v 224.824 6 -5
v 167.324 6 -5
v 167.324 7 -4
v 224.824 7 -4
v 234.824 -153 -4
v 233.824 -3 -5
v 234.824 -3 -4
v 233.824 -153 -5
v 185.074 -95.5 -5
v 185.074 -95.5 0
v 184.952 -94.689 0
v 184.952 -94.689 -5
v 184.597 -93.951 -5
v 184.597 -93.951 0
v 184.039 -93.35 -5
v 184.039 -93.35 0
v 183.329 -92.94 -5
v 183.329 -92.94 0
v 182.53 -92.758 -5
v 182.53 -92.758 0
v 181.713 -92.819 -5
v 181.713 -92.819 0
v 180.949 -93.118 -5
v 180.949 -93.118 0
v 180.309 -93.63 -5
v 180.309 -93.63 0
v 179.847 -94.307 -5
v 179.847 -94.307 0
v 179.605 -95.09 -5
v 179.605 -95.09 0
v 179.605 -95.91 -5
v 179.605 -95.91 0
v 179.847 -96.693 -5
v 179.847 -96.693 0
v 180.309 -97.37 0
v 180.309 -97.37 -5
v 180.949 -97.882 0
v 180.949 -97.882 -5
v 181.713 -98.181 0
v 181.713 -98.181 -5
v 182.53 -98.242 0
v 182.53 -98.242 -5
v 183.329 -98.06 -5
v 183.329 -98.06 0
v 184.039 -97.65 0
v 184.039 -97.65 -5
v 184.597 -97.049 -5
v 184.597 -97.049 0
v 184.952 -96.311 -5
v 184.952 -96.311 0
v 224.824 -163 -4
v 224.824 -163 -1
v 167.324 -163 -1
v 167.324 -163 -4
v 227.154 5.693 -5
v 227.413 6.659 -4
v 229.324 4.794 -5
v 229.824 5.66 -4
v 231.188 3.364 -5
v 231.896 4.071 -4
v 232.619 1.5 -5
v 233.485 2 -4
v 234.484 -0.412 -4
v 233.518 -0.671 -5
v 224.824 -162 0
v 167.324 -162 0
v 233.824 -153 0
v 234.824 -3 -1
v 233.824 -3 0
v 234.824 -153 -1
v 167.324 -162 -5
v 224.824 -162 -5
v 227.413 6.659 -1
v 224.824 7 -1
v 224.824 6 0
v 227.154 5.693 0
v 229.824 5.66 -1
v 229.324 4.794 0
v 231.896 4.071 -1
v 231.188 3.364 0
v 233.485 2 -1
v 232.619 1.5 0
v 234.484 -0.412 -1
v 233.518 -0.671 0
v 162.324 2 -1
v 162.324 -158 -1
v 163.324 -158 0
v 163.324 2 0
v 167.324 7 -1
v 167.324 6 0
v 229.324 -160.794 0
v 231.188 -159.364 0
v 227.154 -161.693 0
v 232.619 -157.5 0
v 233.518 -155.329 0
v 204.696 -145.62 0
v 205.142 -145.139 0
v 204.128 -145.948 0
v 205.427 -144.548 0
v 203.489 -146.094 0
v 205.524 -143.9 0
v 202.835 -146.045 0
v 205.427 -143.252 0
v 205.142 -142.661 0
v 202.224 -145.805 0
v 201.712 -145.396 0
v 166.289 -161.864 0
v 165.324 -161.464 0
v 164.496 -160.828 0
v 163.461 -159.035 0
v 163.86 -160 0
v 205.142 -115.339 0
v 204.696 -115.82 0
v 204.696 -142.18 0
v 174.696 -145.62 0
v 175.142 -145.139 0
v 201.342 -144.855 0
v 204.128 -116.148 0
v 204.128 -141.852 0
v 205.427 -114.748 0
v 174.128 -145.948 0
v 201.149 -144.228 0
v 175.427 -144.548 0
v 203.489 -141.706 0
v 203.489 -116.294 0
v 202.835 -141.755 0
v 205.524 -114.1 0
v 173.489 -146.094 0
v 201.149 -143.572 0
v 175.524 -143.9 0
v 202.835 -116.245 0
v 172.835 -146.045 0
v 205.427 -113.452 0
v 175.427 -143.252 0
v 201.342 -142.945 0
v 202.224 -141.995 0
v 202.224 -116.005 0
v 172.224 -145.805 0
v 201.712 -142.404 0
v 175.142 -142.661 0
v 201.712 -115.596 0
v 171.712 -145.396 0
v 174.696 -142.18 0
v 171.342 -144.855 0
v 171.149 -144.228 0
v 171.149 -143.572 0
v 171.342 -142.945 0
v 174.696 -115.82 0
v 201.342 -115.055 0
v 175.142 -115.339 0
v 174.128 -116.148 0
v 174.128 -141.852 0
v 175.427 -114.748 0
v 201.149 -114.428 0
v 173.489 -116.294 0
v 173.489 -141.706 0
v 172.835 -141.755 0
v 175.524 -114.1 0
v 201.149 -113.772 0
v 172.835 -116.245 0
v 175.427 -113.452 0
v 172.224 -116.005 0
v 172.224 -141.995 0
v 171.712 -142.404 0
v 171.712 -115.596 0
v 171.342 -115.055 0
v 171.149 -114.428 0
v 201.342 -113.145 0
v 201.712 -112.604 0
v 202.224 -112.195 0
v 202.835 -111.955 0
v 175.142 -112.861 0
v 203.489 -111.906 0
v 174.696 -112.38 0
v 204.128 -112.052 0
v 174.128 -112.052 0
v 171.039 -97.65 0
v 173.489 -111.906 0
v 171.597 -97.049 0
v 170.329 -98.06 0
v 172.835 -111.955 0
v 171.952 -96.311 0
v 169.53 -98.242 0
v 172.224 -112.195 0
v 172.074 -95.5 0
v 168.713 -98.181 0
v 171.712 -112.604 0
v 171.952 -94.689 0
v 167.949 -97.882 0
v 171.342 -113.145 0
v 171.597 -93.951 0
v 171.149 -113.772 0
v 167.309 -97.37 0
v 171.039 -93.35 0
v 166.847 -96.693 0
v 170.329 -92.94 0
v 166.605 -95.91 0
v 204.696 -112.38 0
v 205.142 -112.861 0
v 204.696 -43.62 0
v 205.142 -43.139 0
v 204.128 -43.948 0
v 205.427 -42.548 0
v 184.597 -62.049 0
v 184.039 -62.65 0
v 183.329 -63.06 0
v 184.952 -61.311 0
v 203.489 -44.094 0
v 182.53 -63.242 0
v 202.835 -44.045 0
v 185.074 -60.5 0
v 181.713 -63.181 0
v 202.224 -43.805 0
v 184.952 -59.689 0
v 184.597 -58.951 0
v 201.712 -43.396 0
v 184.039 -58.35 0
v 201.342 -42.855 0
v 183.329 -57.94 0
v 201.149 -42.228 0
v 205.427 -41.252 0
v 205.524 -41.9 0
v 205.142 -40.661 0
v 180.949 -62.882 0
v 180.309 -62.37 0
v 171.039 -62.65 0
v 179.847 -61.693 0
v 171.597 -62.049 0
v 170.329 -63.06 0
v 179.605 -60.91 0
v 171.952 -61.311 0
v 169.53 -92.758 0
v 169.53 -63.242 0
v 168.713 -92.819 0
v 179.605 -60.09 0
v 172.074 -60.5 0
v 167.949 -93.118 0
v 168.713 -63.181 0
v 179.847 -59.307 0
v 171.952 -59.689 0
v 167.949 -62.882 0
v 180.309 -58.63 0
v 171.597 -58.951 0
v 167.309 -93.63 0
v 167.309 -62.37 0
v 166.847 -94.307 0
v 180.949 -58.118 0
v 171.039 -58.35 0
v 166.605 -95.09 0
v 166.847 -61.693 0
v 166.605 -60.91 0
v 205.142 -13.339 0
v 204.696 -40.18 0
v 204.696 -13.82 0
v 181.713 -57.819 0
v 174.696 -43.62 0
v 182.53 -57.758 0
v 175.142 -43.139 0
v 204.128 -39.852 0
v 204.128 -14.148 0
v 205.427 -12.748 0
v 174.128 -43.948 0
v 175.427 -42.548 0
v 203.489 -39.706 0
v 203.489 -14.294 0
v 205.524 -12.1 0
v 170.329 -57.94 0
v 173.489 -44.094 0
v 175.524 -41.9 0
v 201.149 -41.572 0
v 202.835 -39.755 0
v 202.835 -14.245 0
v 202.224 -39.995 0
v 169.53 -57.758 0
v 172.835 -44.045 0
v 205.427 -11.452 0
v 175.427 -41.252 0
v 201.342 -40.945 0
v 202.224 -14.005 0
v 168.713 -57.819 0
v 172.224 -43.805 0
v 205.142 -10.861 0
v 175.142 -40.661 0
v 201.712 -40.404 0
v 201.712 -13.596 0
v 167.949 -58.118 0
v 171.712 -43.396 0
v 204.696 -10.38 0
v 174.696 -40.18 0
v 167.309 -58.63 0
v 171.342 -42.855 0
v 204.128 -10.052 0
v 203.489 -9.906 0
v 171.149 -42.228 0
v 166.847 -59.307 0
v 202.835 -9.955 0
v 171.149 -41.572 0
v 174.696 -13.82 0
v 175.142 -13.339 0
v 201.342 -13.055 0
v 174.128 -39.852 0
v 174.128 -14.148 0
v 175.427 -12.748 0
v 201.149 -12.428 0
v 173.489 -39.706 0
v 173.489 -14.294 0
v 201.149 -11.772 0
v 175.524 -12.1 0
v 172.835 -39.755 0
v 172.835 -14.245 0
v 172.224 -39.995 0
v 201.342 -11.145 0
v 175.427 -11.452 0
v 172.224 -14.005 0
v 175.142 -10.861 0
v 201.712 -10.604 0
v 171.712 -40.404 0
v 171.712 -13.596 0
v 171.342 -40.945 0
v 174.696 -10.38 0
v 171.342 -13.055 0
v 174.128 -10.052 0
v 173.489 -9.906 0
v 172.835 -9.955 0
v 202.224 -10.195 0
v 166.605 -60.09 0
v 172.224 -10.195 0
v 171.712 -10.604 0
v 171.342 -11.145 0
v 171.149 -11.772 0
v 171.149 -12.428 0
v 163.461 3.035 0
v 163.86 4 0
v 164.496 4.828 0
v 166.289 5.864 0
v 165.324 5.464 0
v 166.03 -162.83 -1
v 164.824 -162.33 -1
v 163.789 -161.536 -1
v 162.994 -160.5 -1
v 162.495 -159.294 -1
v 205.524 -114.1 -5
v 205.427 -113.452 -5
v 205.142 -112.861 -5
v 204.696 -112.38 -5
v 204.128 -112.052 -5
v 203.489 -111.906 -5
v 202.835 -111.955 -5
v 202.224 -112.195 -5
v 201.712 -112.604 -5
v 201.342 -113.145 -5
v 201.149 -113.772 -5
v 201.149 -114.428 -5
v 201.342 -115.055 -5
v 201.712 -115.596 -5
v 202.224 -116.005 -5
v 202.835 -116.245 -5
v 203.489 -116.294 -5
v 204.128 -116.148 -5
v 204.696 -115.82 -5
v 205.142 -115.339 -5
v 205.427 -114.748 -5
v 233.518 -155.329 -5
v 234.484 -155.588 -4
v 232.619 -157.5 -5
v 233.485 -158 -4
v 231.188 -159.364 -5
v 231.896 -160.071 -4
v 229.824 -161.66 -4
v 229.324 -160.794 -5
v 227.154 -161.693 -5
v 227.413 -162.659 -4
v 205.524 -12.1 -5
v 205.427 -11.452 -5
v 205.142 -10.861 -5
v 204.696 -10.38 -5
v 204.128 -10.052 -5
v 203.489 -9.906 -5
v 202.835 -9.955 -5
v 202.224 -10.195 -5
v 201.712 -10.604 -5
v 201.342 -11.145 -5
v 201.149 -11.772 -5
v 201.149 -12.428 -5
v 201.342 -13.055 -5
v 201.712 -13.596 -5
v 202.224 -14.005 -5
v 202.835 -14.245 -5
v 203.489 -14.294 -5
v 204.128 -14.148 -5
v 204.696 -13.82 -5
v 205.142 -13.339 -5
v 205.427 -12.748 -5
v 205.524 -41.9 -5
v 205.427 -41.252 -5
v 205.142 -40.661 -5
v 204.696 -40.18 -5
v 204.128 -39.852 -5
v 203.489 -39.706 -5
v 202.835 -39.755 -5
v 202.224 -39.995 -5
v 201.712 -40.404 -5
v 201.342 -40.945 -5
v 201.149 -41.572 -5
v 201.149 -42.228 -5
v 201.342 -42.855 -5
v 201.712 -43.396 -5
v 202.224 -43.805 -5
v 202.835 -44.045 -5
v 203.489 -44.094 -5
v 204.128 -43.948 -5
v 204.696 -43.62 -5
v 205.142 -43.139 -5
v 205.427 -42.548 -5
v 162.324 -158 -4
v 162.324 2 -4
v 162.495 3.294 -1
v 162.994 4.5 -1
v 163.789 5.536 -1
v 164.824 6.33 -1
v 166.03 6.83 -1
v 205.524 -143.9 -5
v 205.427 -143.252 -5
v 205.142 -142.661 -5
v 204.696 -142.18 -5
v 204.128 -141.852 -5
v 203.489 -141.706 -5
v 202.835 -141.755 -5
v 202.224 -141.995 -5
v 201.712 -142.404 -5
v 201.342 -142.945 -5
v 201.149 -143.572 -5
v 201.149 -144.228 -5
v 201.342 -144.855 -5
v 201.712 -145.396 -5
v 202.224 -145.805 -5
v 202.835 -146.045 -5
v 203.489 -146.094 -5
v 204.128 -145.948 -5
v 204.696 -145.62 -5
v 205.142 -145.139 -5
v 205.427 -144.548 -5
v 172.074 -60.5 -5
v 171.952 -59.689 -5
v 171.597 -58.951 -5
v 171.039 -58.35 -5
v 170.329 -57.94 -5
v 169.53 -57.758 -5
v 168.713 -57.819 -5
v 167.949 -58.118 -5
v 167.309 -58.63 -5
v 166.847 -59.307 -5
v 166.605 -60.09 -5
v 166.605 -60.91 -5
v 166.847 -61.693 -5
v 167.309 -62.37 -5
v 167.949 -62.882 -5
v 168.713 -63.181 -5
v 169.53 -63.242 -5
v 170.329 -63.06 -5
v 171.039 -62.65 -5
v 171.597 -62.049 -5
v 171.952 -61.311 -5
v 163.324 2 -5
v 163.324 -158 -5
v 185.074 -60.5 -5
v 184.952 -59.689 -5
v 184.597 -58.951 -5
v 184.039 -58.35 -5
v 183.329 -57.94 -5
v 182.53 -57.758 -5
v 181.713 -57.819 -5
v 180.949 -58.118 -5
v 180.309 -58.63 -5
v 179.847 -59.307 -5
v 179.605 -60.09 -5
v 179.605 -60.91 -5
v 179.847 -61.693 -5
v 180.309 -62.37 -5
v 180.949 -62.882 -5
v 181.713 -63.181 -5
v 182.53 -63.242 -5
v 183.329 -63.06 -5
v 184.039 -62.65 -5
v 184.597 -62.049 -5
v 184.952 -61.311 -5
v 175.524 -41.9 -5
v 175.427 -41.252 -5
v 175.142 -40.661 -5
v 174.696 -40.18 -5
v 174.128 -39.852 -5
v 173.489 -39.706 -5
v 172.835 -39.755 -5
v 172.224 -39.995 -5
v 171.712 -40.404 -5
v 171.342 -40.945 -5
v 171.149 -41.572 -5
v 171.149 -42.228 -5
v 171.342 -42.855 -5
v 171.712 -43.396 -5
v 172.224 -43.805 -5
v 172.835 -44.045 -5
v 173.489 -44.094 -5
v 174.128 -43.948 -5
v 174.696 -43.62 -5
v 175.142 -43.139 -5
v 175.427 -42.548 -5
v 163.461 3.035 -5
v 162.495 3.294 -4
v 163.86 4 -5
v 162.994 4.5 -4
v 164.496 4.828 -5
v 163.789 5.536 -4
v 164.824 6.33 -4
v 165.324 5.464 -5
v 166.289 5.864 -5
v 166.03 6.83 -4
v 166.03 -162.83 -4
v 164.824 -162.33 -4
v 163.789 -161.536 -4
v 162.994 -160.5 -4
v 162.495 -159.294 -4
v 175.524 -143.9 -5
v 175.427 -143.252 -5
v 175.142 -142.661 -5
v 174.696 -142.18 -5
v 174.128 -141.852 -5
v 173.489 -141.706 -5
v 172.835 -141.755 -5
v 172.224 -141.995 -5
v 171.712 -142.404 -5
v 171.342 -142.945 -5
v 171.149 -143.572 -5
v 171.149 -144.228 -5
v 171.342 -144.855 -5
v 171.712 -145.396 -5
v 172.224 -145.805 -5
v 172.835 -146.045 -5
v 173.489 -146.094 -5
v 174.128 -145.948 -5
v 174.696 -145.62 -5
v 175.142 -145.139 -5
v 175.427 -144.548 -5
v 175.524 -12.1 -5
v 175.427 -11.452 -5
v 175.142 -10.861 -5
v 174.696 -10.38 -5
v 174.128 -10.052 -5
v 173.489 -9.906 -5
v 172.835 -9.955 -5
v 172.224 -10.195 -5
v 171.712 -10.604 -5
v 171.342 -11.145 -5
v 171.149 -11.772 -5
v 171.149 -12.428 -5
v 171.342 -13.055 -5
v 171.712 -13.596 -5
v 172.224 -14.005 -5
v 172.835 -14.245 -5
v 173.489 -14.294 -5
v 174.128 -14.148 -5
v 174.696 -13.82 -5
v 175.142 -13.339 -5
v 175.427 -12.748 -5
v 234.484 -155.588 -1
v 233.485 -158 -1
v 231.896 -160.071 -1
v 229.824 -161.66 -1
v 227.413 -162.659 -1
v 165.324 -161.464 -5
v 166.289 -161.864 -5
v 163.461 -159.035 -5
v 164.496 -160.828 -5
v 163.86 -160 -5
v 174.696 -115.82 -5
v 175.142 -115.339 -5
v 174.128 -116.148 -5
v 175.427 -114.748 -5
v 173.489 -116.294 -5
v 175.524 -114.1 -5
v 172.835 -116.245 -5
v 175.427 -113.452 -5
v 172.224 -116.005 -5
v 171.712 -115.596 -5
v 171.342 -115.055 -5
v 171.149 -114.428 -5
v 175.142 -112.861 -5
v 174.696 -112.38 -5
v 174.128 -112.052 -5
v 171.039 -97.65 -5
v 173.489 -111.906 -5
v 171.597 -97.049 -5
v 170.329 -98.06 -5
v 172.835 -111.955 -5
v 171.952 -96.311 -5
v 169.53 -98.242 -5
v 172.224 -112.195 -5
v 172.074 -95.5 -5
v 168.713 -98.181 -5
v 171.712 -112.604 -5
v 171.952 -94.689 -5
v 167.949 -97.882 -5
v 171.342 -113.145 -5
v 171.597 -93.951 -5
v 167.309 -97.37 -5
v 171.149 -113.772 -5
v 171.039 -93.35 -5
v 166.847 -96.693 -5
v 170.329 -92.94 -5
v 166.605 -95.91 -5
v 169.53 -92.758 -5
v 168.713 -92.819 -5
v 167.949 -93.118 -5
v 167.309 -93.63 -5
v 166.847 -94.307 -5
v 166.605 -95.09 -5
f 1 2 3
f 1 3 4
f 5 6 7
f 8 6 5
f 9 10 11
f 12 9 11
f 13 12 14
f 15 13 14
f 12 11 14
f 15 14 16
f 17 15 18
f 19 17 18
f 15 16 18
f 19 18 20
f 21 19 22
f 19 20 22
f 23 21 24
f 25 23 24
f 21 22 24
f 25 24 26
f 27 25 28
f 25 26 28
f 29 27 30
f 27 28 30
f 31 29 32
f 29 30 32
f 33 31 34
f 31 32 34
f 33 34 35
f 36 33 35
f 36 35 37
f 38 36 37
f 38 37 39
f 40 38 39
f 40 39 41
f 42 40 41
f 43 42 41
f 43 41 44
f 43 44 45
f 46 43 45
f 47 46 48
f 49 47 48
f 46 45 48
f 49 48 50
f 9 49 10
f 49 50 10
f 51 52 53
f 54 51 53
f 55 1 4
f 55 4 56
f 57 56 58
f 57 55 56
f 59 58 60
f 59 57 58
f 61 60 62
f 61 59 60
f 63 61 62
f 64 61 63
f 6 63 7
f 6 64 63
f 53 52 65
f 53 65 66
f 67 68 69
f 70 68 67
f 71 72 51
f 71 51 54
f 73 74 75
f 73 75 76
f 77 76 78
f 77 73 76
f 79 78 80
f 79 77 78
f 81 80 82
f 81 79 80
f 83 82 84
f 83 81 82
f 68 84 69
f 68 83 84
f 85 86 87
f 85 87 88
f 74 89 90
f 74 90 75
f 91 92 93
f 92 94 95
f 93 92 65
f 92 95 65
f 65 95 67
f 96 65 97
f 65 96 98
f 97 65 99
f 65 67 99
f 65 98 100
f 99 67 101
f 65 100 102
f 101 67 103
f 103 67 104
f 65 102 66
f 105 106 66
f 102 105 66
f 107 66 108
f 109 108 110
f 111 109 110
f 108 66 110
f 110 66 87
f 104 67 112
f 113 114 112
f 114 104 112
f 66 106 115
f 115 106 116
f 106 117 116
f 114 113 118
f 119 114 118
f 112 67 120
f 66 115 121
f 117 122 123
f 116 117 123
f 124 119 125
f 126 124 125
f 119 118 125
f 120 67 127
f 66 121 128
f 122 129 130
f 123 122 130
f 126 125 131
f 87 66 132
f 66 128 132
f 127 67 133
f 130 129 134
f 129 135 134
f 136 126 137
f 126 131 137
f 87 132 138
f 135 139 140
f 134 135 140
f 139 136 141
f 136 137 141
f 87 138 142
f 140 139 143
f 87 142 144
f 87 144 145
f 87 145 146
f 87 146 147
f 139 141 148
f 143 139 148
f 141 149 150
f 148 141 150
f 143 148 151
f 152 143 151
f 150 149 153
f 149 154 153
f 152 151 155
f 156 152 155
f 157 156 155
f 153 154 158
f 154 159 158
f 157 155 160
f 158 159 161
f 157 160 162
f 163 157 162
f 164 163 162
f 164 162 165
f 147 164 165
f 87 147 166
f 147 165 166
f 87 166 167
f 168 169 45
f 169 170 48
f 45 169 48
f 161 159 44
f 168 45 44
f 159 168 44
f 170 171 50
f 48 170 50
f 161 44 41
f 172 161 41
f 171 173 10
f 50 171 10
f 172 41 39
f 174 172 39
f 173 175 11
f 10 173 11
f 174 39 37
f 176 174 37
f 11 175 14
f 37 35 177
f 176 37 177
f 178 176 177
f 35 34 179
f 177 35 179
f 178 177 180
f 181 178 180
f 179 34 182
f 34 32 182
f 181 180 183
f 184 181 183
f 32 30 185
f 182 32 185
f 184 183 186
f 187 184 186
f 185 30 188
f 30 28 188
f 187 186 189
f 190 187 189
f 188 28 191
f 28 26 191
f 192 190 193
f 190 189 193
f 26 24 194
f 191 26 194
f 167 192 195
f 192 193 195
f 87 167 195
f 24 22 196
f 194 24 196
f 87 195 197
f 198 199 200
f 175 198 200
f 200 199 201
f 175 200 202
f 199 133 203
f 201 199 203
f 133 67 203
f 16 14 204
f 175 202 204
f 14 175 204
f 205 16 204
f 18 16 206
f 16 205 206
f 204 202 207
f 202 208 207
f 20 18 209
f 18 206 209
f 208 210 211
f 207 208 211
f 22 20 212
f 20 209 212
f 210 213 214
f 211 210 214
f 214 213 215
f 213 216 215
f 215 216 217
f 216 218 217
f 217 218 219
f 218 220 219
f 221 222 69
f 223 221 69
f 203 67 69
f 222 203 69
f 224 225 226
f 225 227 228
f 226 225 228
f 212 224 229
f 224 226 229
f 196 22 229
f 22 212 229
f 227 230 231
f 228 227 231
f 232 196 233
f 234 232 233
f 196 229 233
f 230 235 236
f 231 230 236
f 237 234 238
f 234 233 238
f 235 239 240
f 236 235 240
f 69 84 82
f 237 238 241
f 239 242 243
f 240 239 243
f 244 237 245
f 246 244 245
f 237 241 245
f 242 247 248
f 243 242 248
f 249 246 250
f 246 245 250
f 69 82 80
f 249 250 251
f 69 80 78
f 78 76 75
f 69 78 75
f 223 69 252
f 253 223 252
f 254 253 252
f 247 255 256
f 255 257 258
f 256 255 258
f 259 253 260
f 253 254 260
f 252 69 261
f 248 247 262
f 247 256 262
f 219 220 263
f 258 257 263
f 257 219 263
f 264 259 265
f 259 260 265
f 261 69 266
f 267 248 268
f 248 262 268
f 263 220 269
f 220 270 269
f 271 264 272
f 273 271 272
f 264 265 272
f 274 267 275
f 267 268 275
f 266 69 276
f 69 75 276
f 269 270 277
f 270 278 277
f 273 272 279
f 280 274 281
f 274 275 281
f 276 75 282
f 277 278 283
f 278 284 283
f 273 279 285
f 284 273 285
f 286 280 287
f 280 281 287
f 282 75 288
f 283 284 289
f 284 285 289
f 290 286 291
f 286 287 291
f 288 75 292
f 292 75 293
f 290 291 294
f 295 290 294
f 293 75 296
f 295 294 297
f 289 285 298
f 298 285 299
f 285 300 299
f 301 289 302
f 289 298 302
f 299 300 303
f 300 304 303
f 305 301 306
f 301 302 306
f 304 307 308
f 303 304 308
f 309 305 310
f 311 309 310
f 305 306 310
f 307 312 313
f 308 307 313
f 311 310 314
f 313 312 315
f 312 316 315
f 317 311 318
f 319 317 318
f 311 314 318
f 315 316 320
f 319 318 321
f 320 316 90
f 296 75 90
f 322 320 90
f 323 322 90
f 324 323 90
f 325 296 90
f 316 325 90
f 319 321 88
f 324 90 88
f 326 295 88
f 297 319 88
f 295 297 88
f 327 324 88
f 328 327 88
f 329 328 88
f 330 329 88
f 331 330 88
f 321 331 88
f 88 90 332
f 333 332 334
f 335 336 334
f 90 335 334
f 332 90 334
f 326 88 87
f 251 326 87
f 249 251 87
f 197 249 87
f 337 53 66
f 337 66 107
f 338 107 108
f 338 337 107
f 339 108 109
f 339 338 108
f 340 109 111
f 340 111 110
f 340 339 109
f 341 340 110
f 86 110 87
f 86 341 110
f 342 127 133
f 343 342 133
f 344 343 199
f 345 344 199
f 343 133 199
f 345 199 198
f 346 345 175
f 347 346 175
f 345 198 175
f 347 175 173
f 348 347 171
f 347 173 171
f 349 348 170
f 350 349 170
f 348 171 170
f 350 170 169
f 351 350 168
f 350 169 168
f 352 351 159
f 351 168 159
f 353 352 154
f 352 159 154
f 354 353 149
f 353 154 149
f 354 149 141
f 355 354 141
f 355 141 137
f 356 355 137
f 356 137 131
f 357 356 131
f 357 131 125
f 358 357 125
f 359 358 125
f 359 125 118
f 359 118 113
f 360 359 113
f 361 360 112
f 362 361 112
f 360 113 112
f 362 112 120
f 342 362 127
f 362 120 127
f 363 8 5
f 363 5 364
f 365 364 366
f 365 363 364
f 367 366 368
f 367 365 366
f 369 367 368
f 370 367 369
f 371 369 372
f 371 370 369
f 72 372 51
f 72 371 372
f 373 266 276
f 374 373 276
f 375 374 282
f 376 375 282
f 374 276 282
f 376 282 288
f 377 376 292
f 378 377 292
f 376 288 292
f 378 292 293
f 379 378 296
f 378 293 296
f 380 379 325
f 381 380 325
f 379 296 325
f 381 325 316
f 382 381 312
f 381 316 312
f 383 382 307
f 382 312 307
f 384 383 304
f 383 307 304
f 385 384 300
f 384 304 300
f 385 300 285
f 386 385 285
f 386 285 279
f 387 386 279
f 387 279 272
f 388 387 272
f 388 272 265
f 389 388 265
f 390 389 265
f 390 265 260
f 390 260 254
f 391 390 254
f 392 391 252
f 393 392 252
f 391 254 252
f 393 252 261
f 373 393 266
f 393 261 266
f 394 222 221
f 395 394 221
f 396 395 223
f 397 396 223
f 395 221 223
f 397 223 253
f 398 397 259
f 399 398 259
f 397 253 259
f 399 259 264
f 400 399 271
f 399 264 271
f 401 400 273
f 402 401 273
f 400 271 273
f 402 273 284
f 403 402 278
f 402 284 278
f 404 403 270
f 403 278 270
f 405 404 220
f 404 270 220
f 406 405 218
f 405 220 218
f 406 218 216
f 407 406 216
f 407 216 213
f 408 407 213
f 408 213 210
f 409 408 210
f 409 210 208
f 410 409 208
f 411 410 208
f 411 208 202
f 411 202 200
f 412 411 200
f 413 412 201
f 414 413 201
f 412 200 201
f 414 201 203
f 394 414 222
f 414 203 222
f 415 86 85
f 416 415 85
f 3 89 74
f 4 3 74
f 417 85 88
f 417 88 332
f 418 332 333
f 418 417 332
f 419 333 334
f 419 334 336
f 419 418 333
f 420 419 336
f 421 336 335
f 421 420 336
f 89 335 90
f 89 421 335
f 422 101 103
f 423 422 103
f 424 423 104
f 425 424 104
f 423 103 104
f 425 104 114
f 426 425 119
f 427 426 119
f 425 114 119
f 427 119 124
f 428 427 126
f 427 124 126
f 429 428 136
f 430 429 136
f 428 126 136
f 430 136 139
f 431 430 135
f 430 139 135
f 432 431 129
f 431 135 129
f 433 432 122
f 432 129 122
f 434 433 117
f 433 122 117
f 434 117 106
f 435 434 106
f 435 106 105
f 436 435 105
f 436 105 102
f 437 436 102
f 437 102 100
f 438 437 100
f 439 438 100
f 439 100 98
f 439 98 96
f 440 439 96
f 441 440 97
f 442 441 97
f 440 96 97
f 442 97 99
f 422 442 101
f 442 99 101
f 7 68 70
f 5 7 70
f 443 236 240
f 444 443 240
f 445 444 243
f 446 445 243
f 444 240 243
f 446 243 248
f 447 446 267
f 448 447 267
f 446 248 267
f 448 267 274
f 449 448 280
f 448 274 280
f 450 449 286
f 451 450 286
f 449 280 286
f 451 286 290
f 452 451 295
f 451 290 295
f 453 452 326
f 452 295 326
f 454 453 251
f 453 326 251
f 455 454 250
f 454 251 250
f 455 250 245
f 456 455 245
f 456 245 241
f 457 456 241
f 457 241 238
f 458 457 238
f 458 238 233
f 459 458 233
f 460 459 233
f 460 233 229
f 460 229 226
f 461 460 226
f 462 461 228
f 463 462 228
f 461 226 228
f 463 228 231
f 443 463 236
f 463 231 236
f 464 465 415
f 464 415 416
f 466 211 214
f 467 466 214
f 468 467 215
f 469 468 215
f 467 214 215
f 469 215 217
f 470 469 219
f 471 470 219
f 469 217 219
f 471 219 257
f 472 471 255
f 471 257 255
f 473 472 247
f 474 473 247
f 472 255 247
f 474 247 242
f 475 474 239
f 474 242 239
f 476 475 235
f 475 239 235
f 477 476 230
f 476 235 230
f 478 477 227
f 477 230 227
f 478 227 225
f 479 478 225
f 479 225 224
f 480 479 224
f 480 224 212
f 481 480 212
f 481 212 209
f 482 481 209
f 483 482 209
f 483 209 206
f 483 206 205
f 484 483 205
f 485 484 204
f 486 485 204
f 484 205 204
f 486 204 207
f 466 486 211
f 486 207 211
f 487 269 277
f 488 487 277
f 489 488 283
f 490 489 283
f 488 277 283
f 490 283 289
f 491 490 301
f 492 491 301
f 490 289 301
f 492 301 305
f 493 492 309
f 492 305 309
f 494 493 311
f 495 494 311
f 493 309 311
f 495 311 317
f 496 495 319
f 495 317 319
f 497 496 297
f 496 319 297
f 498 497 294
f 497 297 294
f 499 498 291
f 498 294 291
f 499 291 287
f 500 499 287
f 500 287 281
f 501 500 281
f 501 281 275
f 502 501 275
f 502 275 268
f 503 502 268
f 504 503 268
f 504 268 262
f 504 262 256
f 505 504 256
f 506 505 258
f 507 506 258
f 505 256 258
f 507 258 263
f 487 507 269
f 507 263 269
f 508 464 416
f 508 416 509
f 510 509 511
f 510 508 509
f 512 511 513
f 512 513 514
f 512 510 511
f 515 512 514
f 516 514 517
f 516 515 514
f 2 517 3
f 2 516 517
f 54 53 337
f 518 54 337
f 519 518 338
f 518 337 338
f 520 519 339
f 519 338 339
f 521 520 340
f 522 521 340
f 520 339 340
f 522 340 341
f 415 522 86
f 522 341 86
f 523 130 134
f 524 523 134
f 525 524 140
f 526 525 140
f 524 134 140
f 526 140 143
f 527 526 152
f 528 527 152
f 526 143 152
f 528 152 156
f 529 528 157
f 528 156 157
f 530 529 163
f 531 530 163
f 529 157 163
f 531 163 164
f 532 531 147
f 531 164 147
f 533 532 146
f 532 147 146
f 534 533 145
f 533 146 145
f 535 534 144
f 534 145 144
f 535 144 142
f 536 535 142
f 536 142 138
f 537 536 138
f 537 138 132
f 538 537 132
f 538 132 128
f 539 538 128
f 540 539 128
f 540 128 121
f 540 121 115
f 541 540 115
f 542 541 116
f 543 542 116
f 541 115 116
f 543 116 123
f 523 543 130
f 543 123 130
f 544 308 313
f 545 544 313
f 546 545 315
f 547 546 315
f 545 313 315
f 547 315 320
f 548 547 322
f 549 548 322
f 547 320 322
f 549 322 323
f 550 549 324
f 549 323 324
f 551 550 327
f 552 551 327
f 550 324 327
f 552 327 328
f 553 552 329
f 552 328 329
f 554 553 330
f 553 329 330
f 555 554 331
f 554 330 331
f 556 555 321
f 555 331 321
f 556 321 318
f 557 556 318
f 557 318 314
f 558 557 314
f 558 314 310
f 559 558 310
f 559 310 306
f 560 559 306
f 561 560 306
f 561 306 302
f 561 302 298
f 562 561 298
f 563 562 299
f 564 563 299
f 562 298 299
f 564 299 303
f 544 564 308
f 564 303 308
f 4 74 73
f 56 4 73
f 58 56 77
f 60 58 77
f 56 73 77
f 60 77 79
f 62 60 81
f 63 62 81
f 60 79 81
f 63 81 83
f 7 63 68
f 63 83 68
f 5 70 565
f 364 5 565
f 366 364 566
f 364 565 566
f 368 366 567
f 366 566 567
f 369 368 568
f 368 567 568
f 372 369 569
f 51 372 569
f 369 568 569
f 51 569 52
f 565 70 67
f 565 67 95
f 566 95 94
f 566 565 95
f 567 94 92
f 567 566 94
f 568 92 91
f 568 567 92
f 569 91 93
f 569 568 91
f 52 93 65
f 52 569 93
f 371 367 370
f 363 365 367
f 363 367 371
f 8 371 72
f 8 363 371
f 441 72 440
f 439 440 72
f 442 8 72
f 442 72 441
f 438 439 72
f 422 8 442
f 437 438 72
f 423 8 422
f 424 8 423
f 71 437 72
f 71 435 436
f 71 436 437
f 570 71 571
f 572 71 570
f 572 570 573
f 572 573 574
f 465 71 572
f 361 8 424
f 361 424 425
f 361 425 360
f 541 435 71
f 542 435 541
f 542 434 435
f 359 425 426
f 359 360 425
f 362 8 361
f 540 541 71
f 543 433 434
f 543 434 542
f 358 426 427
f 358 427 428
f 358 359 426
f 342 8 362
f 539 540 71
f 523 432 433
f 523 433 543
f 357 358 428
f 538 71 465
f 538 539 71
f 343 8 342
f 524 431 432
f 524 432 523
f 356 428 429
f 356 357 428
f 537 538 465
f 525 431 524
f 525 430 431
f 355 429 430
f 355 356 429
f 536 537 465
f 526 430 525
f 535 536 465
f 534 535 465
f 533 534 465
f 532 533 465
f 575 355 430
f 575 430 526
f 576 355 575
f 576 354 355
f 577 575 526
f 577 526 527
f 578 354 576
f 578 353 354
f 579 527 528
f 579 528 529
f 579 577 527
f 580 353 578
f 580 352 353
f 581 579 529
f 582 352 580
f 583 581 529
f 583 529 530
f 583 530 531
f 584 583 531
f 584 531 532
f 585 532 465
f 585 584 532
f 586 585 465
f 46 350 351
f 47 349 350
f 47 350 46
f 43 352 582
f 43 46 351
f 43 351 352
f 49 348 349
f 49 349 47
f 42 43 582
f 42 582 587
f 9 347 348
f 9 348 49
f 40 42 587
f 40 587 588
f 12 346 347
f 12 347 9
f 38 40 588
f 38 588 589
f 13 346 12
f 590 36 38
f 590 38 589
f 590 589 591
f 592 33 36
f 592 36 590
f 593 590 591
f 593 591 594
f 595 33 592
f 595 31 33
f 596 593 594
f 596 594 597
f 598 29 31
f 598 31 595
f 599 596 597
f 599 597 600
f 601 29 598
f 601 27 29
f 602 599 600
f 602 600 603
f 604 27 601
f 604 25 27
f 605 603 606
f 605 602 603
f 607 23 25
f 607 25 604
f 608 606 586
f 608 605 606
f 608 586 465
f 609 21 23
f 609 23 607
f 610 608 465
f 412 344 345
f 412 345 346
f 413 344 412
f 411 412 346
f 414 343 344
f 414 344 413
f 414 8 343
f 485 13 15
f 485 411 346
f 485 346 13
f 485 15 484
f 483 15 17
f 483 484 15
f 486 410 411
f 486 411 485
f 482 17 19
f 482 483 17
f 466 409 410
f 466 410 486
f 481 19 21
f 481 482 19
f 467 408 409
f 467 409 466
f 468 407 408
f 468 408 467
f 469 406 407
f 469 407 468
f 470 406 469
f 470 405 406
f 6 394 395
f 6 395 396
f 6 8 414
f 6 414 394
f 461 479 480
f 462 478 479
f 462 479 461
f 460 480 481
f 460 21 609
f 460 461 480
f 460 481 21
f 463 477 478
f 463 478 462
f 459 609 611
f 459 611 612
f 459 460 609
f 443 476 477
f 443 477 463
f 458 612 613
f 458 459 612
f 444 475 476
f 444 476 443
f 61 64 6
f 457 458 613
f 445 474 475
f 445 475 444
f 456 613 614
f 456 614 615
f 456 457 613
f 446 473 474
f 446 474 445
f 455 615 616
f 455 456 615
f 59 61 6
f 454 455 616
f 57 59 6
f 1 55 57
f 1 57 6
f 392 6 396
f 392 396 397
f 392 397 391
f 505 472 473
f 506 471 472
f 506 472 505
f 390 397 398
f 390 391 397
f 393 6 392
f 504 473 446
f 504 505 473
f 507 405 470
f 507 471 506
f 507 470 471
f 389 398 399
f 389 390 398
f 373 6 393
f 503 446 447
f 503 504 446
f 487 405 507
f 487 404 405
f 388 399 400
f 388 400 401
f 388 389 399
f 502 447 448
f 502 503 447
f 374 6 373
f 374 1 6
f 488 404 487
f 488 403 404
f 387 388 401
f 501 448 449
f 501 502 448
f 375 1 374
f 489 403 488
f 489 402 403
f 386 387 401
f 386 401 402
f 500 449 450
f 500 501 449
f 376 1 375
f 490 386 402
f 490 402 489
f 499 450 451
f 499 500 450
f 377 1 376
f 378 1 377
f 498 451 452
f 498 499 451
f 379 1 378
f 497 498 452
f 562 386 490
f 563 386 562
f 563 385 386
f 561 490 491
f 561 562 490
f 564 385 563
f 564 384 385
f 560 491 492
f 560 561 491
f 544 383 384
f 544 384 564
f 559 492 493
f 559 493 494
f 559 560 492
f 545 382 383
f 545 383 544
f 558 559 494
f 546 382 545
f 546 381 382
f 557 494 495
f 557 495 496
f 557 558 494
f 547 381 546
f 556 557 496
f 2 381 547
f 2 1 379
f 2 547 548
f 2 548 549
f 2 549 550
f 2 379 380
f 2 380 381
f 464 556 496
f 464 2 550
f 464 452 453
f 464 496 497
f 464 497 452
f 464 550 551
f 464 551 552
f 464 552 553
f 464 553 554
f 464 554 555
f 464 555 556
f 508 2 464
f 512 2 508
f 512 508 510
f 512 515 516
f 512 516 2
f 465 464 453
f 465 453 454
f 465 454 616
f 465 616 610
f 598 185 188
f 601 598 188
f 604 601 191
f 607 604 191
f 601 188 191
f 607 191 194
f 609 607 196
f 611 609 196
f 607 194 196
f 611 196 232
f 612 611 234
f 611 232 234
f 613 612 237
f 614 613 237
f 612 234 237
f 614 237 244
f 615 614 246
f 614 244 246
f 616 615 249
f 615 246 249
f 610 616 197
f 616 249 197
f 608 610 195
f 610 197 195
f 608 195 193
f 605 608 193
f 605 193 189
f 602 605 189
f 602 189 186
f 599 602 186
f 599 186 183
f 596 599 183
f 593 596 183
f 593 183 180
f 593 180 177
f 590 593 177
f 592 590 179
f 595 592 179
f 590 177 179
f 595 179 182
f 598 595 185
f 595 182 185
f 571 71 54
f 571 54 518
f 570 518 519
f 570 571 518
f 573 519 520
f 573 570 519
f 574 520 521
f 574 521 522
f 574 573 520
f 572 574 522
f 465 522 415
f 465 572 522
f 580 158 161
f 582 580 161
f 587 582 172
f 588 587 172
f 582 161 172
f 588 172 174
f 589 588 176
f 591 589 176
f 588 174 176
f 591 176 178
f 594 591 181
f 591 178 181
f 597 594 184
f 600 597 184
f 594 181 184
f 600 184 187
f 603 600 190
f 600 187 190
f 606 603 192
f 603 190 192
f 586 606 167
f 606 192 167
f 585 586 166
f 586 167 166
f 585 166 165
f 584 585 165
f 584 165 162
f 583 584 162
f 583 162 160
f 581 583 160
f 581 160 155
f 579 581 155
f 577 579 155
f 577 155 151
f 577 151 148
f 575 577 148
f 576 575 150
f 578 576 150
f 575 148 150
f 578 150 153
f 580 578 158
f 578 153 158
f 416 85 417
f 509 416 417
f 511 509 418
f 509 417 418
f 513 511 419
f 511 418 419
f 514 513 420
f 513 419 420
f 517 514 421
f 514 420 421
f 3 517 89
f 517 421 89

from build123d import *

# Parameters (mm, degrees)
EXTRUDE_1_DEPTH     = 5
SKETCH_4_R          = 2.2
SKETCH_4_R_2        = 2.75
CUT_EXTRUDE_1_DEPTH = 5
CHAMFER_2_SIZE      = 1


with BuildPart() as part:
    # 草图1 → 凸台-拉伸1 (new body)
    with BuildSketch(Plane.XY):
        with BuildLine():
            Line((234.824487649, -3.000003036), (234.824487649, -152.999988316))
            ThreePointArc((234.824487649, -152.999988316), (231.895556179, -160.071055409), (224.824489681, -162.999988316))
            Line((224.824489681, -162.999988316), (167.324488665, -163))
            ThreePointArc((167.324488665, -163), (163.788954102, -161.535534265), (162.324487649, -158))
            Line((162.324487649, -158), (162.324487649, 2))
            ThreePointArc((162.324487649, 2), (163.788953837, 5.535533999), (167.324487913, 7))
            Line((167.324487913, 7), (224.824488177, 6.999996964))
            ThreePointArc((224.824488177, 6.999996964), (231.895555648, 4.071064589), (234.824487649, -3.000003036))
        make_face()
    extrude(amount=-EXTRUDE_1_DEPTH)

    # 草图4 → 切除-拉伸1 (cut)
    with BuildSketch(Plane.XY):
        with Locations((203.324487649, -12.1)):
            Circle(SKETCH_4_R)
        with Locations((173.324487649, -12.1)):
            Circle(SKETCH_4_R)
        with Locations((173.324487649, -41.9)):
            Circle(SKETCH_4_R)
        with Locations((203.324487649, -41.9)):
            Circle(SKETCH_4_R)
        with Locations((173.324487649, -143.9)):
            Circle(SKETCH_4_R)
        with Locations((203.324487649, -143.9)):
            Circle(SKETCH_4_R)
        with Locations((173.324487649, -114.1)):
            Circle(SKETCH_4_R)
        with Locations((203.324487649, -114.1)):
            Circle(SKETCH_4_R)
        with Locations((169.324487649, -60.5)):
            Circle(SKETCH_4_R_2)
        with Locations((169.324487649, -95.5)):
            Circle(SKETCH_4_R_2)
        with Locations((182.324487649, -60.5)):
            Circle(SKETCH_4_R_2)
        with Locations((182.324487649, -95.5)):
            Circle(SKETCH_4_R_2)
    extrude(amount=-CUT_EXTRUDE_1_DEPTH, mode=Mode.SUBTRACT)

    # 倒角2
    chamfer_2_edges = [part.edges().sort_by_distance(p)[0] for p in [
        (196.074489173, -162.999994158, 0),
        (163.788954102, -161.535534265, 0),
        (231.895555648, 4.071064589, -5),
        (162.324487649, -78, 0),
        (163.788953837, 5.535533999, 0),
        (196.074488045, 6.999998482, 0),
        (231.895555648, 4.071064589, 0),
        (234.824487649, -77.999995676, 0),
        (196.074488045, 6.999998482, -5),
        (163.788953837, 5.535533999, -5),
        (162.324487649, -78, -5),
        (163.788954102, -161.535534265, -5),
        (196.074489173, -162.999994158, -5),
        (231.895556179, -160.071055409, -5),
        (234.824487649, -77.999995676, -5),
        (231.895556179, -160.071055409, 0),
    ]]
    chamfer(chamfer_2_edges, length=CHAMFER_2_SIZE)


solid = part.part
